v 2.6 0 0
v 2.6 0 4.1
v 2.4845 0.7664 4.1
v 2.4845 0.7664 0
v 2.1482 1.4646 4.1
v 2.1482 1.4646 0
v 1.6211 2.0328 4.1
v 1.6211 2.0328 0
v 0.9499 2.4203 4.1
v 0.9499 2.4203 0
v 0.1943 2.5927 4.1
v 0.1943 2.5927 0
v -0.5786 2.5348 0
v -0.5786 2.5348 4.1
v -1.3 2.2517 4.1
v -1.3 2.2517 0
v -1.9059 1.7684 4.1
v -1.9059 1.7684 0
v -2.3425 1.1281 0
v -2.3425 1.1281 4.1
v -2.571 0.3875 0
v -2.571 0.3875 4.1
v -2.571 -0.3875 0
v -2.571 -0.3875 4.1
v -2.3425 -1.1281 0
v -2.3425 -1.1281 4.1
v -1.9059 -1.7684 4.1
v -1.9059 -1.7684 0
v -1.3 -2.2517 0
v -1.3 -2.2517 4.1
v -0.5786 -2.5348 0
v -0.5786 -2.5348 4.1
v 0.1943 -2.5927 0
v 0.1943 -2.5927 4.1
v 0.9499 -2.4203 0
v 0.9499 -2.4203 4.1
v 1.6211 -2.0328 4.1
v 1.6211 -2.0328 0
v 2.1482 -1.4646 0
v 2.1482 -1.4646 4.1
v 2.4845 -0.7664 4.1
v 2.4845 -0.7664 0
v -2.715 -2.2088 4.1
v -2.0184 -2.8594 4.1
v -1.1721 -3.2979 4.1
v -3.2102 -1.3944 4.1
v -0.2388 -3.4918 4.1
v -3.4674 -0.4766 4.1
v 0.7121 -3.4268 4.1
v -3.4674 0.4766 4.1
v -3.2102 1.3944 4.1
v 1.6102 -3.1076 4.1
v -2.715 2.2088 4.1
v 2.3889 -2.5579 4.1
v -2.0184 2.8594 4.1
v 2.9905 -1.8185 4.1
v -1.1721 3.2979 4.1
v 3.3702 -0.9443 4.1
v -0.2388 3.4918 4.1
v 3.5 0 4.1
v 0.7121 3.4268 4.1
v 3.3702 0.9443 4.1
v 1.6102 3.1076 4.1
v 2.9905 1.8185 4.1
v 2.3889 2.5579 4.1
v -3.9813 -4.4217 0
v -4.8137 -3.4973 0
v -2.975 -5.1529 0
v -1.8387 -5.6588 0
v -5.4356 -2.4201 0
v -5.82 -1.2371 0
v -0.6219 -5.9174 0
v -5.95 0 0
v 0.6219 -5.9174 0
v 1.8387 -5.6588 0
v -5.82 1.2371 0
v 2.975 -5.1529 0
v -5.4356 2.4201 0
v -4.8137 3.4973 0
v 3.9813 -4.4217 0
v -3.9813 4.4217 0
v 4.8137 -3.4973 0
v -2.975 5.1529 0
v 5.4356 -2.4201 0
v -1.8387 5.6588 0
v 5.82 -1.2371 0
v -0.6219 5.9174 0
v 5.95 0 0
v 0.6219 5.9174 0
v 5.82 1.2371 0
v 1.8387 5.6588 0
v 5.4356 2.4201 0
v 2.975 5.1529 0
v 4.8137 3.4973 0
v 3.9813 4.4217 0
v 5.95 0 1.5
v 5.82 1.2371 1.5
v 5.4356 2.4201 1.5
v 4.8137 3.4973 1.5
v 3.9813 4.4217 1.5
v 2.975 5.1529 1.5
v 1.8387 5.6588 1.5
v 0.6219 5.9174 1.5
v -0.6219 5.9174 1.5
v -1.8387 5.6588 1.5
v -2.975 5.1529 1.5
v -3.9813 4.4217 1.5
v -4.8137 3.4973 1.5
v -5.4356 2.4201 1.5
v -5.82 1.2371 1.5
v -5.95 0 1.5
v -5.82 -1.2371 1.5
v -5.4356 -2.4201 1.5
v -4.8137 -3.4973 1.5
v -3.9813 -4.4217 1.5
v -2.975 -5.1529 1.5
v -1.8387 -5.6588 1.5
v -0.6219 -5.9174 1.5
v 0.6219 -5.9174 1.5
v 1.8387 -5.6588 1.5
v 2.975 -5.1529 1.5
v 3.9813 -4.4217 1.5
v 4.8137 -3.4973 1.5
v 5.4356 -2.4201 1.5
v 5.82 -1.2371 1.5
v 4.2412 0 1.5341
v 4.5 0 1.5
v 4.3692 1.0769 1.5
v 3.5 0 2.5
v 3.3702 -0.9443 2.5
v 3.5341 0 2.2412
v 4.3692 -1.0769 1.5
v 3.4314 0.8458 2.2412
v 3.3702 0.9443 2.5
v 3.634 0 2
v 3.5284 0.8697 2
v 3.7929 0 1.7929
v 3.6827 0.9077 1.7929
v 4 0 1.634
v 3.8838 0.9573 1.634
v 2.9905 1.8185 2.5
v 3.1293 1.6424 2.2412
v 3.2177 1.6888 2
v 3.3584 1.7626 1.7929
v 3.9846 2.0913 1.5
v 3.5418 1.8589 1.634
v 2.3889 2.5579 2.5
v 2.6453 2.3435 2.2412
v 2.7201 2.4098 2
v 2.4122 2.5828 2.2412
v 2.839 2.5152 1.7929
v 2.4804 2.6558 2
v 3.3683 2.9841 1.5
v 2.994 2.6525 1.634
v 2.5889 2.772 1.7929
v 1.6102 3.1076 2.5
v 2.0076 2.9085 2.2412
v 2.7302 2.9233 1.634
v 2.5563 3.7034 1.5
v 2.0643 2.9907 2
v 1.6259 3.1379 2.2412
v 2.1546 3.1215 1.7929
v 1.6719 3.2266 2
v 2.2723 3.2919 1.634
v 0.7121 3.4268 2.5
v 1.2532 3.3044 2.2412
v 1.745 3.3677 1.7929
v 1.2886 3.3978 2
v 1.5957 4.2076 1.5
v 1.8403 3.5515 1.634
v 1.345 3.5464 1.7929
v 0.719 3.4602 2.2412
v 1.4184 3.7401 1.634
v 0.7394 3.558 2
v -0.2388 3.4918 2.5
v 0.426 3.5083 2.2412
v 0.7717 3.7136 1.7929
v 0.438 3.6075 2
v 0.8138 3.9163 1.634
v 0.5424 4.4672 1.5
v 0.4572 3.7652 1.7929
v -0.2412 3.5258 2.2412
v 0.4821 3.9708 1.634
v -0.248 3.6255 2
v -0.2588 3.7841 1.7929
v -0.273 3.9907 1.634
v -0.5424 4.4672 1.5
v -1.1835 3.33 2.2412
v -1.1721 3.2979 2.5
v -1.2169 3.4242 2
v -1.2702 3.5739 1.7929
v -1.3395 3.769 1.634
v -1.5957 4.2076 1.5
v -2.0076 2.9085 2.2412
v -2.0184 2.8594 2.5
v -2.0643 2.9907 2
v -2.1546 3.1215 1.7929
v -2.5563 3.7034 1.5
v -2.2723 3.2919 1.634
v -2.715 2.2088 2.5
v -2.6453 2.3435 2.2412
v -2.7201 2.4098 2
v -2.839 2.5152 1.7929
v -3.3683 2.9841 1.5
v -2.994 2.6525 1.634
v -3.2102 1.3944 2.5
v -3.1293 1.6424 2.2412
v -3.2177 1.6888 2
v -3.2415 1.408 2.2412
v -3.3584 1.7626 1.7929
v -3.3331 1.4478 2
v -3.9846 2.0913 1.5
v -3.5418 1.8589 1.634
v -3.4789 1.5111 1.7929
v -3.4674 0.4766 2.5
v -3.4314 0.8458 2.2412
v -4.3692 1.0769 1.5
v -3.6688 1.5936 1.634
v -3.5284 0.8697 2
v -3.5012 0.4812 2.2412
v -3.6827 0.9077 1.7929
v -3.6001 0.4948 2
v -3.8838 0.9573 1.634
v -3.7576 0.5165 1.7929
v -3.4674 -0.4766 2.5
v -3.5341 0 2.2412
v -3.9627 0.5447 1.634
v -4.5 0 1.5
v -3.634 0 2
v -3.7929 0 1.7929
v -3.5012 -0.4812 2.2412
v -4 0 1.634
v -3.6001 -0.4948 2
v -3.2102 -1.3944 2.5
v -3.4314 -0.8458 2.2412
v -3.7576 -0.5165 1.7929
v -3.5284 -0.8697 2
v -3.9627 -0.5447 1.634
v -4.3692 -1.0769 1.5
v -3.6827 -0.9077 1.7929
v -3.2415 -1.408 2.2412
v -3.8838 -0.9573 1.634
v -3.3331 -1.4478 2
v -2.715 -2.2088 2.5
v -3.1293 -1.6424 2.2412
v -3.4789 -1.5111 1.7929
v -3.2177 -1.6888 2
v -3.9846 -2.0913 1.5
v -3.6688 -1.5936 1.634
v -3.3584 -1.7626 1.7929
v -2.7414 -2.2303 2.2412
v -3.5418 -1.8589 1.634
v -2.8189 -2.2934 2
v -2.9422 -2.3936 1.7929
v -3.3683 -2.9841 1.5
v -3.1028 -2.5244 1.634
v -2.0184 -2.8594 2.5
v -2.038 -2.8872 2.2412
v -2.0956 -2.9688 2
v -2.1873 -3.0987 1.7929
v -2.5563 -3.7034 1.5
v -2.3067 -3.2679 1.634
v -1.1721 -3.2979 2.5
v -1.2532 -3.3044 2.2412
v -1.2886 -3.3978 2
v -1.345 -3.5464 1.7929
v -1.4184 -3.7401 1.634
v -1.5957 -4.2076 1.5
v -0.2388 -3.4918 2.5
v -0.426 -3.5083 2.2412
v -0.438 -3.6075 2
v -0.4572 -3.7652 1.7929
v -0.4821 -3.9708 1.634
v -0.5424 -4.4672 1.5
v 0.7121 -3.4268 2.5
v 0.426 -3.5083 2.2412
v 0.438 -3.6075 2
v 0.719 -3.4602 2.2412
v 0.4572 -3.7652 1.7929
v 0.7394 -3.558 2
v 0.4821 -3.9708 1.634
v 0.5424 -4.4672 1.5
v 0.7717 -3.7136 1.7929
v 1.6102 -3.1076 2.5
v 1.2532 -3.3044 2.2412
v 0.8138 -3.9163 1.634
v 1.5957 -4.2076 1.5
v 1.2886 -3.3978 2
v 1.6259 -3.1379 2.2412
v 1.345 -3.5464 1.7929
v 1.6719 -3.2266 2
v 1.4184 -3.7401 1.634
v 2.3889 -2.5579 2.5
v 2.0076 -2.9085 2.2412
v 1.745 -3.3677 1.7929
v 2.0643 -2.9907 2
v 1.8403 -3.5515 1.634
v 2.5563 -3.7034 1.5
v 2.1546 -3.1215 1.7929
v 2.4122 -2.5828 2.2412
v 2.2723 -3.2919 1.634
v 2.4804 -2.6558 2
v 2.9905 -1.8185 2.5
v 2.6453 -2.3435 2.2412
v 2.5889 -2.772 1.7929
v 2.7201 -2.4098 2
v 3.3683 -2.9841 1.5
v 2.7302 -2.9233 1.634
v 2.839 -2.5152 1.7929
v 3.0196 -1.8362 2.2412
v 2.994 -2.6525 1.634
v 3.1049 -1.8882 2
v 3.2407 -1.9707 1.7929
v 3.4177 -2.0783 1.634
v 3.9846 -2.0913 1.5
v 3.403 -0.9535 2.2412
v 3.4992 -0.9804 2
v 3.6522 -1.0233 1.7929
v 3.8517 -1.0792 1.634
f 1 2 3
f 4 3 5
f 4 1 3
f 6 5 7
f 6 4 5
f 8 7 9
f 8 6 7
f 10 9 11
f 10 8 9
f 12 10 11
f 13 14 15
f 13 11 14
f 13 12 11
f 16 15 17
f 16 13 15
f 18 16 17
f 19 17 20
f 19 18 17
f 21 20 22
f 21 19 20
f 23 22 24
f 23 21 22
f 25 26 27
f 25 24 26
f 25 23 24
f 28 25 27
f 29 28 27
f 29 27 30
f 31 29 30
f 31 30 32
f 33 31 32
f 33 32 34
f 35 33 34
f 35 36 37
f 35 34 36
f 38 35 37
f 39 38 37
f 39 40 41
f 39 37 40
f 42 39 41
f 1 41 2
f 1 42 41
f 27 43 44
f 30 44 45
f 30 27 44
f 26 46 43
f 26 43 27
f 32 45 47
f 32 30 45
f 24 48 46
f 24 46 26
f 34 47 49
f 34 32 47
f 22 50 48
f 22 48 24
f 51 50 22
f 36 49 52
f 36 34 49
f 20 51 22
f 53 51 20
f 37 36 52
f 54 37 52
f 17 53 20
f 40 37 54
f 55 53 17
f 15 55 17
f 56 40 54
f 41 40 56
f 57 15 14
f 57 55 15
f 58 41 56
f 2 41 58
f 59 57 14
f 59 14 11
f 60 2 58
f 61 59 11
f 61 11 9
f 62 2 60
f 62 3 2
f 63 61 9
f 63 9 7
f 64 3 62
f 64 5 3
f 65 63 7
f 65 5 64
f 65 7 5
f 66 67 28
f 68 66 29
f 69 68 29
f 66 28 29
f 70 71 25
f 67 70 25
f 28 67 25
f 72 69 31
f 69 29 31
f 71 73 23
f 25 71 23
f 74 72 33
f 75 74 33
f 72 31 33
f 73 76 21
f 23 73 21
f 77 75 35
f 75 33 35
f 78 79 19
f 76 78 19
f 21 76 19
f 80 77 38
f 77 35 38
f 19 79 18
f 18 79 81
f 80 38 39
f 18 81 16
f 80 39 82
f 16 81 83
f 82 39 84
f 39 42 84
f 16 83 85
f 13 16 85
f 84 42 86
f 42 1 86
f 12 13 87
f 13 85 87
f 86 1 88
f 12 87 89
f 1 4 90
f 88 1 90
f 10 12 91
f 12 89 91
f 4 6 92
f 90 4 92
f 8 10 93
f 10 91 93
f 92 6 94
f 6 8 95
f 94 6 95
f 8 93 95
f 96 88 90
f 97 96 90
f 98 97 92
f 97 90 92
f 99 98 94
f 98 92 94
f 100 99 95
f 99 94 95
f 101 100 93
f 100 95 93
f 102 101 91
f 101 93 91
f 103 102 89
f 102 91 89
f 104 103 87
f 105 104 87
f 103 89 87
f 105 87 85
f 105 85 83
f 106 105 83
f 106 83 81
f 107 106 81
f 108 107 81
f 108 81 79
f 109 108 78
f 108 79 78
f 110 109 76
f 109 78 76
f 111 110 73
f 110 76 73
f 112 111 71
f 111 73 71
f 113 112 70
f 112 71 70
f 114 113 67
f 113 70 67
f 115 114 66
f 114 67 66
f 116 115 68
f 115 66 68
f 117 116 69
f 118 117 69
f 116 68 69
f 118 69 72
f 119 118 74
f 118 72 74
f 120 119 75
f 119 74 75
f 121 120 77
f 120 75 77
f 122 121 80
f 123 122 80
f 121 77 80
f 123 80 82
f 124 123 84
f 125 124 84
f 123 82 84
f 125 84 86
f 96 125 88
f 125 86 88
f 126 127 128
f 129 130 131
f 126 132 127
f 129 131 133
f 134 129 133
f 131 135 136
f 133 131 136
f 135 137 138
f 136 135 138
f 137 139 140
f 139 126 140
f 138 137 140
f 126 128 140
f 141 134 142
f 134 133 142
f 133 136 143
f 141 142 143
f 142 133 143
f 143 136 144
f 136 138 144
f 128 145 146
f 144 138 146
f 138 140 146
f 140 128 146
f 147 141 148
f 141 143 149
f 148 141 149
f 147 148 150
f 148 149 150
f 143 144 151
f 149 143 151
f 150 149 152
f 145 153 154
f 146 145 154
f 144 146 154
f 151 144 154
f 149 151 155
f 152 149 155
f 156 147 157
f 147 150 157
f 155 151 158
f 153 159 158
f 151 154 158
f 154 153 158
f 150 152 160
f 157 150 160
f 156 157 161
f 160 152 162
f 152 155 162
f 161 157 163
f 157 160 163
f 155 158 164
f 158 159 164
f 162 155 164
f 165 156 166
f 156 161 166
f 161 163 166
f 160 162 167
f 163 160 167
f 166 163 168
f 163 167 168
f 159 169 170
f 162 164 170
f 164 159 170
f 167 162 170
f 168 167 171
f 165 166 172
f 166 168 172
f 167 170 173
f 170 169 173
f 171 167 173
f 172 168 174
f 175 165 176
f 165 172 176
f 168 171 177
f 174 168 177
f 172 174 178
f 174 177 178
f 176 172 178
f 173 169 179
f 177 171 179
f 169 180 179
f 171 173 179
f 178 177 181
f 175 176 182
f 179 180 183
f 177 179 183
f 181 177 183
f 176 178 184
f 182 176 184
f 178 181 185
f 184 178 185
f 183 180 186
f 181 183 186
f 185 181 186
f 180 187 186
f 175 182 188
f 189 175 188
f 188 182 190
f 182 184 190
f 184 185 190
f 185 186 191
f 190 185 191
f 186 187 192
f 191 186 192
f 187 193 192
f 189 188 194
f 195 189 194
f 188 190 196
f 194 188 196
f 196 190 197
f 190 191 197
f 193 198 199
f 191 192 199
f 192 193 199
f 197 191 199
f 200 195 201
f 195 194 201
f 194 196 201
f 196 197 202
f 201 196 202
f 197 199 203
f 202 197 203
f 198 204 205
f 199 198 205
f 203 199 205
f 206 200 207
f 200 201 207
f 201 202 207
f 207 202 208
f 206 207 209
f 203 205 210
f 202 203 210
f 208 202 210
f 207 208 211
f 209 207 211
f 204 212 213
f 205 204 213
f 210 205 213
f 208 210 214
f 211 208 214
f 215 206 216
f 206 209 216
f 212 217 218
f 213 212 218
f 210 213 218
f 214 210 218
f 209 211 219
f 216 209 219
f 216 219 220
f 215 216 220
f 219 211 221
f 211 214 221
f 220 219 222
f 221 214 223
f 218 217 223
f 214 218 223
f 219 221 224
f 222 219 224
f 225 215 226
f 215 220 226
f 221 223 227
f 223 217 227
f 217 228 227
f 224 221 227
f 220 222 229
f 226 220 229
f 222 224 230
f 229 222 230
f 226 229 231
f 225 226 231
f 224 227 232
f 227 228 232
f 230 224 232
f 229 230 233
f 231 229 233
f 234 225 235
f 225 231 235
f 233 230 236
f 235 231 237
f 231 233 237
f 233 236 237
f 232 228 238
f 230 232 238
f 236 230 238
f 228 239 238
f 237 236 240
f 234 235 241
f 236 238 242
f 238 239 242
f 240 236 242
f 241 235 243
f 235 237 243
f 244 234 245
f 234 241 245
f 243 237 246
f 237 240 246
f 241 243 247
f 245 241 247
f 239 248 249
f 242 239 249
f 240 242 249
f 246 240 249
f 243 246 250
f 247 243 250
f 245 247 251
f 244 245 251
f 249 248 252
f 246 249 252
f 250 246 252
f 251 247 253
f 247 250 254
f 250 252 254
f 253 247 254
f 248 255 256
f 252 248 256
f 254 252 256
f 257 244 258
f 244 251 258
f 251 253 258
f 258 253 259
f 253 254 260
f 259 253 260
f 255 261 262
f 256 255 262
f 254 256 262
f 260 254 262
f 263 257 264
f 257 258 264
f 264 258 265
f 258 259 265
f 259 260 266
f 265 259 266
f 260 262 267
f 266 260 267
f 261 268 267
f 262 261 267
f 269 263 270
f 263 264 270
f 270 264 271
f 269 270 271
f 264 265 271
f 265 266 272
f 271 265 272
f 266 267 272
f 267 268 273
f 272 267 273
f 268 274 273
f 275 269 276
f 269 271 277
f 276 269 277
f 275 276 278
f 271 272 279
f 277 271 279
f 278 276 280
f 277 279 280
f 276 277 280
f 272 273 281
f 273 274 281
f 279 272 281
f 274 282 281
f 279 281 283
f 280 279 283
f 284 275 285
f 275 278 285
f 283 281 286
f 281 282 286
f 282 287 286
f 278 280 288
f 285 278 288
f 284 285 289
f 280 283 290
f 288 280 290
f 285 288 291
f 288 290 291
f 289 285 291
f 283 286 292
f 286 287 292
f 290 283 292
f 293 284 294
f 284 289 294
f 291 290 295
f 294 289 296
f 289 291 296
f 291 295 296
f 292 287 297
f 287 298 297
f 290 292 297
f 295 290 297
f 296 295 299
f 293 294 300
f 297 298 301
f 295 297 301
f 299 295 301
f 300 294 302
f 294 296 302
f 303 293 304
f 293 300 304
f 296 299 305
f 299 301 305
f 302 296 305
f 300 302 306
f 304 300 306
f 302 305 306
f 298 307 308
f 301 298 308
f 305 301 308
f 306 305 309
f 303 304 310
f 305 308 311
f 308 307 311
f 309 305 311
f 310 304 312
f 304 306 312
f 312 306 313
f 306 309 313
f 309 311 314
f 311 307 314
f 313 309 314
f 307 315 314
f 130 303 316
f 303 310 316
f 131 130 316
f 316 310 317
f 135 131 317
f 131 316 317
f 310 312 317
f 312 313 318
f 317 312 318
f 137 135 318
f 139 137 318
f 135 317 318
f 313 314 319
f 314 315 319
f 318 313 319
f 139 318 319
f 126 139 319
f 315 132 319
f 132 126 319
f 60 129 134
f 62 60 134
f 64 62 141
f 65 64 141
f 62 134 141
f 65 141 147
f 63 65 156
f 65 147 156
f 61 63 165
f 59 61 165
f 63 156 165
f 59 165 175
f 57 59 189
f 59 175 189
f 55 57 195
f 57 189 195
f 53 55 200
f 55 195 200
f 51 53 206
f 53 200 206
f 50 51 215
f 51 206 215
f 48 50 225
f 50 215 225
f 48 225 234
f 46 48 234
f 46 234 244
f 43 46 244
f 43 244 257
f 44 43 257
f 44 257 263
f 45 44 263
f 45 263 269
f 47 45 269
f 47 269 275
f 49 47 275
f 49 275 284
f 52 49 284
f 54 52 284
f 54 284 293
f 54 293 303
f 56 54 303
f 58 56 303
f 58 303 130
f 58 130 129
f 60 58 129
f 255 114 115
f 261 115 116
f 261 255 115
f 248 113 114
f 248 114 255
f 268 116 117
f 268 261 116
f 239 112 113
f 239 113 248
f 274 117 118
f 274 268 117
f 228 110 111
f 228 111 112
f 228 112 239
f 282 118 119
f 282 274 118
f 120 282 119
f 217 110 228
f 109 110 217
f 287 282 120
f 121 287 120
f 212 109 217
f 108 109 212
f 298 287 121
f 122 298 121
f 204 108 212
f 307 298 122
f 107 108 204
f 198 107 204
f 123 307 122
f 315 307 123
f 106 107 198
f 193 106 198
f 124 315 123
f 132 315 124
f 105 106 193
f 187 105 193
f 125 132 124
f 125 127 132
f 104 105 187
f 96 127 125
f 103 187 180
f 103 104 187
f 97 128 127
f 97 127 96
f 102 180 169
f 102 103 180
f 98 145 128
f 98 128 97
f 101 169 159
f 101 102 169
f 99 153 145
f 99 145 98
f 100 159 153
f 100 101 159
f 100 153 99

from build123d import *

# Parameters (mm, degrees)
SKETCH_1_R          = 5.95
SKETCH_1_R_2        = 3.5
EXTRUDE_1_DEPTH     = 1.5
SKETCH_1_2_R        = 3.5
EXTRUDE_2_DEPTH     = 4.1
SKETCH_2_R          = 2.6
CUT_EXTRUDE_1_DEPTH = 10.360288457
FILLET_1_R          = 1


with BuildPart() as part:
    # 草图1 → 凸台-拉伸1 (new body)
    with BuildSketch(Plane.XY):
        Circle(SKETCH_1_R)
        Circle(SKETCH_1_R_2, mode=Mode.SUBTRACT)
    extrude(amount=EXTRUDE_1_DEPTH)

    # 草图1<2> → 凸台-拉伸2 (add)
    with BuildSketch(Plane.XY):
        Circle(SKETCH_1_2_R)
    extrude(amount=EXTRUDE_2_DEPTH)

    # 草图2 → 切除-拉伸1 (cut, through all)
    with BuildSketch(Plane.XY):
        Circle(SKETCH_2_R)
    extrude(amount=CUT_EXTRUDE_1_DEPTH, mode=Mode.SUBTRACT)

    # 圆角1
    fillet_1_edges = [part.edges().sort_by_distance(p)[0] for p in [
        (-3.5, 0, 1.5),
    ]]
    fillet(fillet_1_edges, radius=FILLET_1_R)


solid = part.part
